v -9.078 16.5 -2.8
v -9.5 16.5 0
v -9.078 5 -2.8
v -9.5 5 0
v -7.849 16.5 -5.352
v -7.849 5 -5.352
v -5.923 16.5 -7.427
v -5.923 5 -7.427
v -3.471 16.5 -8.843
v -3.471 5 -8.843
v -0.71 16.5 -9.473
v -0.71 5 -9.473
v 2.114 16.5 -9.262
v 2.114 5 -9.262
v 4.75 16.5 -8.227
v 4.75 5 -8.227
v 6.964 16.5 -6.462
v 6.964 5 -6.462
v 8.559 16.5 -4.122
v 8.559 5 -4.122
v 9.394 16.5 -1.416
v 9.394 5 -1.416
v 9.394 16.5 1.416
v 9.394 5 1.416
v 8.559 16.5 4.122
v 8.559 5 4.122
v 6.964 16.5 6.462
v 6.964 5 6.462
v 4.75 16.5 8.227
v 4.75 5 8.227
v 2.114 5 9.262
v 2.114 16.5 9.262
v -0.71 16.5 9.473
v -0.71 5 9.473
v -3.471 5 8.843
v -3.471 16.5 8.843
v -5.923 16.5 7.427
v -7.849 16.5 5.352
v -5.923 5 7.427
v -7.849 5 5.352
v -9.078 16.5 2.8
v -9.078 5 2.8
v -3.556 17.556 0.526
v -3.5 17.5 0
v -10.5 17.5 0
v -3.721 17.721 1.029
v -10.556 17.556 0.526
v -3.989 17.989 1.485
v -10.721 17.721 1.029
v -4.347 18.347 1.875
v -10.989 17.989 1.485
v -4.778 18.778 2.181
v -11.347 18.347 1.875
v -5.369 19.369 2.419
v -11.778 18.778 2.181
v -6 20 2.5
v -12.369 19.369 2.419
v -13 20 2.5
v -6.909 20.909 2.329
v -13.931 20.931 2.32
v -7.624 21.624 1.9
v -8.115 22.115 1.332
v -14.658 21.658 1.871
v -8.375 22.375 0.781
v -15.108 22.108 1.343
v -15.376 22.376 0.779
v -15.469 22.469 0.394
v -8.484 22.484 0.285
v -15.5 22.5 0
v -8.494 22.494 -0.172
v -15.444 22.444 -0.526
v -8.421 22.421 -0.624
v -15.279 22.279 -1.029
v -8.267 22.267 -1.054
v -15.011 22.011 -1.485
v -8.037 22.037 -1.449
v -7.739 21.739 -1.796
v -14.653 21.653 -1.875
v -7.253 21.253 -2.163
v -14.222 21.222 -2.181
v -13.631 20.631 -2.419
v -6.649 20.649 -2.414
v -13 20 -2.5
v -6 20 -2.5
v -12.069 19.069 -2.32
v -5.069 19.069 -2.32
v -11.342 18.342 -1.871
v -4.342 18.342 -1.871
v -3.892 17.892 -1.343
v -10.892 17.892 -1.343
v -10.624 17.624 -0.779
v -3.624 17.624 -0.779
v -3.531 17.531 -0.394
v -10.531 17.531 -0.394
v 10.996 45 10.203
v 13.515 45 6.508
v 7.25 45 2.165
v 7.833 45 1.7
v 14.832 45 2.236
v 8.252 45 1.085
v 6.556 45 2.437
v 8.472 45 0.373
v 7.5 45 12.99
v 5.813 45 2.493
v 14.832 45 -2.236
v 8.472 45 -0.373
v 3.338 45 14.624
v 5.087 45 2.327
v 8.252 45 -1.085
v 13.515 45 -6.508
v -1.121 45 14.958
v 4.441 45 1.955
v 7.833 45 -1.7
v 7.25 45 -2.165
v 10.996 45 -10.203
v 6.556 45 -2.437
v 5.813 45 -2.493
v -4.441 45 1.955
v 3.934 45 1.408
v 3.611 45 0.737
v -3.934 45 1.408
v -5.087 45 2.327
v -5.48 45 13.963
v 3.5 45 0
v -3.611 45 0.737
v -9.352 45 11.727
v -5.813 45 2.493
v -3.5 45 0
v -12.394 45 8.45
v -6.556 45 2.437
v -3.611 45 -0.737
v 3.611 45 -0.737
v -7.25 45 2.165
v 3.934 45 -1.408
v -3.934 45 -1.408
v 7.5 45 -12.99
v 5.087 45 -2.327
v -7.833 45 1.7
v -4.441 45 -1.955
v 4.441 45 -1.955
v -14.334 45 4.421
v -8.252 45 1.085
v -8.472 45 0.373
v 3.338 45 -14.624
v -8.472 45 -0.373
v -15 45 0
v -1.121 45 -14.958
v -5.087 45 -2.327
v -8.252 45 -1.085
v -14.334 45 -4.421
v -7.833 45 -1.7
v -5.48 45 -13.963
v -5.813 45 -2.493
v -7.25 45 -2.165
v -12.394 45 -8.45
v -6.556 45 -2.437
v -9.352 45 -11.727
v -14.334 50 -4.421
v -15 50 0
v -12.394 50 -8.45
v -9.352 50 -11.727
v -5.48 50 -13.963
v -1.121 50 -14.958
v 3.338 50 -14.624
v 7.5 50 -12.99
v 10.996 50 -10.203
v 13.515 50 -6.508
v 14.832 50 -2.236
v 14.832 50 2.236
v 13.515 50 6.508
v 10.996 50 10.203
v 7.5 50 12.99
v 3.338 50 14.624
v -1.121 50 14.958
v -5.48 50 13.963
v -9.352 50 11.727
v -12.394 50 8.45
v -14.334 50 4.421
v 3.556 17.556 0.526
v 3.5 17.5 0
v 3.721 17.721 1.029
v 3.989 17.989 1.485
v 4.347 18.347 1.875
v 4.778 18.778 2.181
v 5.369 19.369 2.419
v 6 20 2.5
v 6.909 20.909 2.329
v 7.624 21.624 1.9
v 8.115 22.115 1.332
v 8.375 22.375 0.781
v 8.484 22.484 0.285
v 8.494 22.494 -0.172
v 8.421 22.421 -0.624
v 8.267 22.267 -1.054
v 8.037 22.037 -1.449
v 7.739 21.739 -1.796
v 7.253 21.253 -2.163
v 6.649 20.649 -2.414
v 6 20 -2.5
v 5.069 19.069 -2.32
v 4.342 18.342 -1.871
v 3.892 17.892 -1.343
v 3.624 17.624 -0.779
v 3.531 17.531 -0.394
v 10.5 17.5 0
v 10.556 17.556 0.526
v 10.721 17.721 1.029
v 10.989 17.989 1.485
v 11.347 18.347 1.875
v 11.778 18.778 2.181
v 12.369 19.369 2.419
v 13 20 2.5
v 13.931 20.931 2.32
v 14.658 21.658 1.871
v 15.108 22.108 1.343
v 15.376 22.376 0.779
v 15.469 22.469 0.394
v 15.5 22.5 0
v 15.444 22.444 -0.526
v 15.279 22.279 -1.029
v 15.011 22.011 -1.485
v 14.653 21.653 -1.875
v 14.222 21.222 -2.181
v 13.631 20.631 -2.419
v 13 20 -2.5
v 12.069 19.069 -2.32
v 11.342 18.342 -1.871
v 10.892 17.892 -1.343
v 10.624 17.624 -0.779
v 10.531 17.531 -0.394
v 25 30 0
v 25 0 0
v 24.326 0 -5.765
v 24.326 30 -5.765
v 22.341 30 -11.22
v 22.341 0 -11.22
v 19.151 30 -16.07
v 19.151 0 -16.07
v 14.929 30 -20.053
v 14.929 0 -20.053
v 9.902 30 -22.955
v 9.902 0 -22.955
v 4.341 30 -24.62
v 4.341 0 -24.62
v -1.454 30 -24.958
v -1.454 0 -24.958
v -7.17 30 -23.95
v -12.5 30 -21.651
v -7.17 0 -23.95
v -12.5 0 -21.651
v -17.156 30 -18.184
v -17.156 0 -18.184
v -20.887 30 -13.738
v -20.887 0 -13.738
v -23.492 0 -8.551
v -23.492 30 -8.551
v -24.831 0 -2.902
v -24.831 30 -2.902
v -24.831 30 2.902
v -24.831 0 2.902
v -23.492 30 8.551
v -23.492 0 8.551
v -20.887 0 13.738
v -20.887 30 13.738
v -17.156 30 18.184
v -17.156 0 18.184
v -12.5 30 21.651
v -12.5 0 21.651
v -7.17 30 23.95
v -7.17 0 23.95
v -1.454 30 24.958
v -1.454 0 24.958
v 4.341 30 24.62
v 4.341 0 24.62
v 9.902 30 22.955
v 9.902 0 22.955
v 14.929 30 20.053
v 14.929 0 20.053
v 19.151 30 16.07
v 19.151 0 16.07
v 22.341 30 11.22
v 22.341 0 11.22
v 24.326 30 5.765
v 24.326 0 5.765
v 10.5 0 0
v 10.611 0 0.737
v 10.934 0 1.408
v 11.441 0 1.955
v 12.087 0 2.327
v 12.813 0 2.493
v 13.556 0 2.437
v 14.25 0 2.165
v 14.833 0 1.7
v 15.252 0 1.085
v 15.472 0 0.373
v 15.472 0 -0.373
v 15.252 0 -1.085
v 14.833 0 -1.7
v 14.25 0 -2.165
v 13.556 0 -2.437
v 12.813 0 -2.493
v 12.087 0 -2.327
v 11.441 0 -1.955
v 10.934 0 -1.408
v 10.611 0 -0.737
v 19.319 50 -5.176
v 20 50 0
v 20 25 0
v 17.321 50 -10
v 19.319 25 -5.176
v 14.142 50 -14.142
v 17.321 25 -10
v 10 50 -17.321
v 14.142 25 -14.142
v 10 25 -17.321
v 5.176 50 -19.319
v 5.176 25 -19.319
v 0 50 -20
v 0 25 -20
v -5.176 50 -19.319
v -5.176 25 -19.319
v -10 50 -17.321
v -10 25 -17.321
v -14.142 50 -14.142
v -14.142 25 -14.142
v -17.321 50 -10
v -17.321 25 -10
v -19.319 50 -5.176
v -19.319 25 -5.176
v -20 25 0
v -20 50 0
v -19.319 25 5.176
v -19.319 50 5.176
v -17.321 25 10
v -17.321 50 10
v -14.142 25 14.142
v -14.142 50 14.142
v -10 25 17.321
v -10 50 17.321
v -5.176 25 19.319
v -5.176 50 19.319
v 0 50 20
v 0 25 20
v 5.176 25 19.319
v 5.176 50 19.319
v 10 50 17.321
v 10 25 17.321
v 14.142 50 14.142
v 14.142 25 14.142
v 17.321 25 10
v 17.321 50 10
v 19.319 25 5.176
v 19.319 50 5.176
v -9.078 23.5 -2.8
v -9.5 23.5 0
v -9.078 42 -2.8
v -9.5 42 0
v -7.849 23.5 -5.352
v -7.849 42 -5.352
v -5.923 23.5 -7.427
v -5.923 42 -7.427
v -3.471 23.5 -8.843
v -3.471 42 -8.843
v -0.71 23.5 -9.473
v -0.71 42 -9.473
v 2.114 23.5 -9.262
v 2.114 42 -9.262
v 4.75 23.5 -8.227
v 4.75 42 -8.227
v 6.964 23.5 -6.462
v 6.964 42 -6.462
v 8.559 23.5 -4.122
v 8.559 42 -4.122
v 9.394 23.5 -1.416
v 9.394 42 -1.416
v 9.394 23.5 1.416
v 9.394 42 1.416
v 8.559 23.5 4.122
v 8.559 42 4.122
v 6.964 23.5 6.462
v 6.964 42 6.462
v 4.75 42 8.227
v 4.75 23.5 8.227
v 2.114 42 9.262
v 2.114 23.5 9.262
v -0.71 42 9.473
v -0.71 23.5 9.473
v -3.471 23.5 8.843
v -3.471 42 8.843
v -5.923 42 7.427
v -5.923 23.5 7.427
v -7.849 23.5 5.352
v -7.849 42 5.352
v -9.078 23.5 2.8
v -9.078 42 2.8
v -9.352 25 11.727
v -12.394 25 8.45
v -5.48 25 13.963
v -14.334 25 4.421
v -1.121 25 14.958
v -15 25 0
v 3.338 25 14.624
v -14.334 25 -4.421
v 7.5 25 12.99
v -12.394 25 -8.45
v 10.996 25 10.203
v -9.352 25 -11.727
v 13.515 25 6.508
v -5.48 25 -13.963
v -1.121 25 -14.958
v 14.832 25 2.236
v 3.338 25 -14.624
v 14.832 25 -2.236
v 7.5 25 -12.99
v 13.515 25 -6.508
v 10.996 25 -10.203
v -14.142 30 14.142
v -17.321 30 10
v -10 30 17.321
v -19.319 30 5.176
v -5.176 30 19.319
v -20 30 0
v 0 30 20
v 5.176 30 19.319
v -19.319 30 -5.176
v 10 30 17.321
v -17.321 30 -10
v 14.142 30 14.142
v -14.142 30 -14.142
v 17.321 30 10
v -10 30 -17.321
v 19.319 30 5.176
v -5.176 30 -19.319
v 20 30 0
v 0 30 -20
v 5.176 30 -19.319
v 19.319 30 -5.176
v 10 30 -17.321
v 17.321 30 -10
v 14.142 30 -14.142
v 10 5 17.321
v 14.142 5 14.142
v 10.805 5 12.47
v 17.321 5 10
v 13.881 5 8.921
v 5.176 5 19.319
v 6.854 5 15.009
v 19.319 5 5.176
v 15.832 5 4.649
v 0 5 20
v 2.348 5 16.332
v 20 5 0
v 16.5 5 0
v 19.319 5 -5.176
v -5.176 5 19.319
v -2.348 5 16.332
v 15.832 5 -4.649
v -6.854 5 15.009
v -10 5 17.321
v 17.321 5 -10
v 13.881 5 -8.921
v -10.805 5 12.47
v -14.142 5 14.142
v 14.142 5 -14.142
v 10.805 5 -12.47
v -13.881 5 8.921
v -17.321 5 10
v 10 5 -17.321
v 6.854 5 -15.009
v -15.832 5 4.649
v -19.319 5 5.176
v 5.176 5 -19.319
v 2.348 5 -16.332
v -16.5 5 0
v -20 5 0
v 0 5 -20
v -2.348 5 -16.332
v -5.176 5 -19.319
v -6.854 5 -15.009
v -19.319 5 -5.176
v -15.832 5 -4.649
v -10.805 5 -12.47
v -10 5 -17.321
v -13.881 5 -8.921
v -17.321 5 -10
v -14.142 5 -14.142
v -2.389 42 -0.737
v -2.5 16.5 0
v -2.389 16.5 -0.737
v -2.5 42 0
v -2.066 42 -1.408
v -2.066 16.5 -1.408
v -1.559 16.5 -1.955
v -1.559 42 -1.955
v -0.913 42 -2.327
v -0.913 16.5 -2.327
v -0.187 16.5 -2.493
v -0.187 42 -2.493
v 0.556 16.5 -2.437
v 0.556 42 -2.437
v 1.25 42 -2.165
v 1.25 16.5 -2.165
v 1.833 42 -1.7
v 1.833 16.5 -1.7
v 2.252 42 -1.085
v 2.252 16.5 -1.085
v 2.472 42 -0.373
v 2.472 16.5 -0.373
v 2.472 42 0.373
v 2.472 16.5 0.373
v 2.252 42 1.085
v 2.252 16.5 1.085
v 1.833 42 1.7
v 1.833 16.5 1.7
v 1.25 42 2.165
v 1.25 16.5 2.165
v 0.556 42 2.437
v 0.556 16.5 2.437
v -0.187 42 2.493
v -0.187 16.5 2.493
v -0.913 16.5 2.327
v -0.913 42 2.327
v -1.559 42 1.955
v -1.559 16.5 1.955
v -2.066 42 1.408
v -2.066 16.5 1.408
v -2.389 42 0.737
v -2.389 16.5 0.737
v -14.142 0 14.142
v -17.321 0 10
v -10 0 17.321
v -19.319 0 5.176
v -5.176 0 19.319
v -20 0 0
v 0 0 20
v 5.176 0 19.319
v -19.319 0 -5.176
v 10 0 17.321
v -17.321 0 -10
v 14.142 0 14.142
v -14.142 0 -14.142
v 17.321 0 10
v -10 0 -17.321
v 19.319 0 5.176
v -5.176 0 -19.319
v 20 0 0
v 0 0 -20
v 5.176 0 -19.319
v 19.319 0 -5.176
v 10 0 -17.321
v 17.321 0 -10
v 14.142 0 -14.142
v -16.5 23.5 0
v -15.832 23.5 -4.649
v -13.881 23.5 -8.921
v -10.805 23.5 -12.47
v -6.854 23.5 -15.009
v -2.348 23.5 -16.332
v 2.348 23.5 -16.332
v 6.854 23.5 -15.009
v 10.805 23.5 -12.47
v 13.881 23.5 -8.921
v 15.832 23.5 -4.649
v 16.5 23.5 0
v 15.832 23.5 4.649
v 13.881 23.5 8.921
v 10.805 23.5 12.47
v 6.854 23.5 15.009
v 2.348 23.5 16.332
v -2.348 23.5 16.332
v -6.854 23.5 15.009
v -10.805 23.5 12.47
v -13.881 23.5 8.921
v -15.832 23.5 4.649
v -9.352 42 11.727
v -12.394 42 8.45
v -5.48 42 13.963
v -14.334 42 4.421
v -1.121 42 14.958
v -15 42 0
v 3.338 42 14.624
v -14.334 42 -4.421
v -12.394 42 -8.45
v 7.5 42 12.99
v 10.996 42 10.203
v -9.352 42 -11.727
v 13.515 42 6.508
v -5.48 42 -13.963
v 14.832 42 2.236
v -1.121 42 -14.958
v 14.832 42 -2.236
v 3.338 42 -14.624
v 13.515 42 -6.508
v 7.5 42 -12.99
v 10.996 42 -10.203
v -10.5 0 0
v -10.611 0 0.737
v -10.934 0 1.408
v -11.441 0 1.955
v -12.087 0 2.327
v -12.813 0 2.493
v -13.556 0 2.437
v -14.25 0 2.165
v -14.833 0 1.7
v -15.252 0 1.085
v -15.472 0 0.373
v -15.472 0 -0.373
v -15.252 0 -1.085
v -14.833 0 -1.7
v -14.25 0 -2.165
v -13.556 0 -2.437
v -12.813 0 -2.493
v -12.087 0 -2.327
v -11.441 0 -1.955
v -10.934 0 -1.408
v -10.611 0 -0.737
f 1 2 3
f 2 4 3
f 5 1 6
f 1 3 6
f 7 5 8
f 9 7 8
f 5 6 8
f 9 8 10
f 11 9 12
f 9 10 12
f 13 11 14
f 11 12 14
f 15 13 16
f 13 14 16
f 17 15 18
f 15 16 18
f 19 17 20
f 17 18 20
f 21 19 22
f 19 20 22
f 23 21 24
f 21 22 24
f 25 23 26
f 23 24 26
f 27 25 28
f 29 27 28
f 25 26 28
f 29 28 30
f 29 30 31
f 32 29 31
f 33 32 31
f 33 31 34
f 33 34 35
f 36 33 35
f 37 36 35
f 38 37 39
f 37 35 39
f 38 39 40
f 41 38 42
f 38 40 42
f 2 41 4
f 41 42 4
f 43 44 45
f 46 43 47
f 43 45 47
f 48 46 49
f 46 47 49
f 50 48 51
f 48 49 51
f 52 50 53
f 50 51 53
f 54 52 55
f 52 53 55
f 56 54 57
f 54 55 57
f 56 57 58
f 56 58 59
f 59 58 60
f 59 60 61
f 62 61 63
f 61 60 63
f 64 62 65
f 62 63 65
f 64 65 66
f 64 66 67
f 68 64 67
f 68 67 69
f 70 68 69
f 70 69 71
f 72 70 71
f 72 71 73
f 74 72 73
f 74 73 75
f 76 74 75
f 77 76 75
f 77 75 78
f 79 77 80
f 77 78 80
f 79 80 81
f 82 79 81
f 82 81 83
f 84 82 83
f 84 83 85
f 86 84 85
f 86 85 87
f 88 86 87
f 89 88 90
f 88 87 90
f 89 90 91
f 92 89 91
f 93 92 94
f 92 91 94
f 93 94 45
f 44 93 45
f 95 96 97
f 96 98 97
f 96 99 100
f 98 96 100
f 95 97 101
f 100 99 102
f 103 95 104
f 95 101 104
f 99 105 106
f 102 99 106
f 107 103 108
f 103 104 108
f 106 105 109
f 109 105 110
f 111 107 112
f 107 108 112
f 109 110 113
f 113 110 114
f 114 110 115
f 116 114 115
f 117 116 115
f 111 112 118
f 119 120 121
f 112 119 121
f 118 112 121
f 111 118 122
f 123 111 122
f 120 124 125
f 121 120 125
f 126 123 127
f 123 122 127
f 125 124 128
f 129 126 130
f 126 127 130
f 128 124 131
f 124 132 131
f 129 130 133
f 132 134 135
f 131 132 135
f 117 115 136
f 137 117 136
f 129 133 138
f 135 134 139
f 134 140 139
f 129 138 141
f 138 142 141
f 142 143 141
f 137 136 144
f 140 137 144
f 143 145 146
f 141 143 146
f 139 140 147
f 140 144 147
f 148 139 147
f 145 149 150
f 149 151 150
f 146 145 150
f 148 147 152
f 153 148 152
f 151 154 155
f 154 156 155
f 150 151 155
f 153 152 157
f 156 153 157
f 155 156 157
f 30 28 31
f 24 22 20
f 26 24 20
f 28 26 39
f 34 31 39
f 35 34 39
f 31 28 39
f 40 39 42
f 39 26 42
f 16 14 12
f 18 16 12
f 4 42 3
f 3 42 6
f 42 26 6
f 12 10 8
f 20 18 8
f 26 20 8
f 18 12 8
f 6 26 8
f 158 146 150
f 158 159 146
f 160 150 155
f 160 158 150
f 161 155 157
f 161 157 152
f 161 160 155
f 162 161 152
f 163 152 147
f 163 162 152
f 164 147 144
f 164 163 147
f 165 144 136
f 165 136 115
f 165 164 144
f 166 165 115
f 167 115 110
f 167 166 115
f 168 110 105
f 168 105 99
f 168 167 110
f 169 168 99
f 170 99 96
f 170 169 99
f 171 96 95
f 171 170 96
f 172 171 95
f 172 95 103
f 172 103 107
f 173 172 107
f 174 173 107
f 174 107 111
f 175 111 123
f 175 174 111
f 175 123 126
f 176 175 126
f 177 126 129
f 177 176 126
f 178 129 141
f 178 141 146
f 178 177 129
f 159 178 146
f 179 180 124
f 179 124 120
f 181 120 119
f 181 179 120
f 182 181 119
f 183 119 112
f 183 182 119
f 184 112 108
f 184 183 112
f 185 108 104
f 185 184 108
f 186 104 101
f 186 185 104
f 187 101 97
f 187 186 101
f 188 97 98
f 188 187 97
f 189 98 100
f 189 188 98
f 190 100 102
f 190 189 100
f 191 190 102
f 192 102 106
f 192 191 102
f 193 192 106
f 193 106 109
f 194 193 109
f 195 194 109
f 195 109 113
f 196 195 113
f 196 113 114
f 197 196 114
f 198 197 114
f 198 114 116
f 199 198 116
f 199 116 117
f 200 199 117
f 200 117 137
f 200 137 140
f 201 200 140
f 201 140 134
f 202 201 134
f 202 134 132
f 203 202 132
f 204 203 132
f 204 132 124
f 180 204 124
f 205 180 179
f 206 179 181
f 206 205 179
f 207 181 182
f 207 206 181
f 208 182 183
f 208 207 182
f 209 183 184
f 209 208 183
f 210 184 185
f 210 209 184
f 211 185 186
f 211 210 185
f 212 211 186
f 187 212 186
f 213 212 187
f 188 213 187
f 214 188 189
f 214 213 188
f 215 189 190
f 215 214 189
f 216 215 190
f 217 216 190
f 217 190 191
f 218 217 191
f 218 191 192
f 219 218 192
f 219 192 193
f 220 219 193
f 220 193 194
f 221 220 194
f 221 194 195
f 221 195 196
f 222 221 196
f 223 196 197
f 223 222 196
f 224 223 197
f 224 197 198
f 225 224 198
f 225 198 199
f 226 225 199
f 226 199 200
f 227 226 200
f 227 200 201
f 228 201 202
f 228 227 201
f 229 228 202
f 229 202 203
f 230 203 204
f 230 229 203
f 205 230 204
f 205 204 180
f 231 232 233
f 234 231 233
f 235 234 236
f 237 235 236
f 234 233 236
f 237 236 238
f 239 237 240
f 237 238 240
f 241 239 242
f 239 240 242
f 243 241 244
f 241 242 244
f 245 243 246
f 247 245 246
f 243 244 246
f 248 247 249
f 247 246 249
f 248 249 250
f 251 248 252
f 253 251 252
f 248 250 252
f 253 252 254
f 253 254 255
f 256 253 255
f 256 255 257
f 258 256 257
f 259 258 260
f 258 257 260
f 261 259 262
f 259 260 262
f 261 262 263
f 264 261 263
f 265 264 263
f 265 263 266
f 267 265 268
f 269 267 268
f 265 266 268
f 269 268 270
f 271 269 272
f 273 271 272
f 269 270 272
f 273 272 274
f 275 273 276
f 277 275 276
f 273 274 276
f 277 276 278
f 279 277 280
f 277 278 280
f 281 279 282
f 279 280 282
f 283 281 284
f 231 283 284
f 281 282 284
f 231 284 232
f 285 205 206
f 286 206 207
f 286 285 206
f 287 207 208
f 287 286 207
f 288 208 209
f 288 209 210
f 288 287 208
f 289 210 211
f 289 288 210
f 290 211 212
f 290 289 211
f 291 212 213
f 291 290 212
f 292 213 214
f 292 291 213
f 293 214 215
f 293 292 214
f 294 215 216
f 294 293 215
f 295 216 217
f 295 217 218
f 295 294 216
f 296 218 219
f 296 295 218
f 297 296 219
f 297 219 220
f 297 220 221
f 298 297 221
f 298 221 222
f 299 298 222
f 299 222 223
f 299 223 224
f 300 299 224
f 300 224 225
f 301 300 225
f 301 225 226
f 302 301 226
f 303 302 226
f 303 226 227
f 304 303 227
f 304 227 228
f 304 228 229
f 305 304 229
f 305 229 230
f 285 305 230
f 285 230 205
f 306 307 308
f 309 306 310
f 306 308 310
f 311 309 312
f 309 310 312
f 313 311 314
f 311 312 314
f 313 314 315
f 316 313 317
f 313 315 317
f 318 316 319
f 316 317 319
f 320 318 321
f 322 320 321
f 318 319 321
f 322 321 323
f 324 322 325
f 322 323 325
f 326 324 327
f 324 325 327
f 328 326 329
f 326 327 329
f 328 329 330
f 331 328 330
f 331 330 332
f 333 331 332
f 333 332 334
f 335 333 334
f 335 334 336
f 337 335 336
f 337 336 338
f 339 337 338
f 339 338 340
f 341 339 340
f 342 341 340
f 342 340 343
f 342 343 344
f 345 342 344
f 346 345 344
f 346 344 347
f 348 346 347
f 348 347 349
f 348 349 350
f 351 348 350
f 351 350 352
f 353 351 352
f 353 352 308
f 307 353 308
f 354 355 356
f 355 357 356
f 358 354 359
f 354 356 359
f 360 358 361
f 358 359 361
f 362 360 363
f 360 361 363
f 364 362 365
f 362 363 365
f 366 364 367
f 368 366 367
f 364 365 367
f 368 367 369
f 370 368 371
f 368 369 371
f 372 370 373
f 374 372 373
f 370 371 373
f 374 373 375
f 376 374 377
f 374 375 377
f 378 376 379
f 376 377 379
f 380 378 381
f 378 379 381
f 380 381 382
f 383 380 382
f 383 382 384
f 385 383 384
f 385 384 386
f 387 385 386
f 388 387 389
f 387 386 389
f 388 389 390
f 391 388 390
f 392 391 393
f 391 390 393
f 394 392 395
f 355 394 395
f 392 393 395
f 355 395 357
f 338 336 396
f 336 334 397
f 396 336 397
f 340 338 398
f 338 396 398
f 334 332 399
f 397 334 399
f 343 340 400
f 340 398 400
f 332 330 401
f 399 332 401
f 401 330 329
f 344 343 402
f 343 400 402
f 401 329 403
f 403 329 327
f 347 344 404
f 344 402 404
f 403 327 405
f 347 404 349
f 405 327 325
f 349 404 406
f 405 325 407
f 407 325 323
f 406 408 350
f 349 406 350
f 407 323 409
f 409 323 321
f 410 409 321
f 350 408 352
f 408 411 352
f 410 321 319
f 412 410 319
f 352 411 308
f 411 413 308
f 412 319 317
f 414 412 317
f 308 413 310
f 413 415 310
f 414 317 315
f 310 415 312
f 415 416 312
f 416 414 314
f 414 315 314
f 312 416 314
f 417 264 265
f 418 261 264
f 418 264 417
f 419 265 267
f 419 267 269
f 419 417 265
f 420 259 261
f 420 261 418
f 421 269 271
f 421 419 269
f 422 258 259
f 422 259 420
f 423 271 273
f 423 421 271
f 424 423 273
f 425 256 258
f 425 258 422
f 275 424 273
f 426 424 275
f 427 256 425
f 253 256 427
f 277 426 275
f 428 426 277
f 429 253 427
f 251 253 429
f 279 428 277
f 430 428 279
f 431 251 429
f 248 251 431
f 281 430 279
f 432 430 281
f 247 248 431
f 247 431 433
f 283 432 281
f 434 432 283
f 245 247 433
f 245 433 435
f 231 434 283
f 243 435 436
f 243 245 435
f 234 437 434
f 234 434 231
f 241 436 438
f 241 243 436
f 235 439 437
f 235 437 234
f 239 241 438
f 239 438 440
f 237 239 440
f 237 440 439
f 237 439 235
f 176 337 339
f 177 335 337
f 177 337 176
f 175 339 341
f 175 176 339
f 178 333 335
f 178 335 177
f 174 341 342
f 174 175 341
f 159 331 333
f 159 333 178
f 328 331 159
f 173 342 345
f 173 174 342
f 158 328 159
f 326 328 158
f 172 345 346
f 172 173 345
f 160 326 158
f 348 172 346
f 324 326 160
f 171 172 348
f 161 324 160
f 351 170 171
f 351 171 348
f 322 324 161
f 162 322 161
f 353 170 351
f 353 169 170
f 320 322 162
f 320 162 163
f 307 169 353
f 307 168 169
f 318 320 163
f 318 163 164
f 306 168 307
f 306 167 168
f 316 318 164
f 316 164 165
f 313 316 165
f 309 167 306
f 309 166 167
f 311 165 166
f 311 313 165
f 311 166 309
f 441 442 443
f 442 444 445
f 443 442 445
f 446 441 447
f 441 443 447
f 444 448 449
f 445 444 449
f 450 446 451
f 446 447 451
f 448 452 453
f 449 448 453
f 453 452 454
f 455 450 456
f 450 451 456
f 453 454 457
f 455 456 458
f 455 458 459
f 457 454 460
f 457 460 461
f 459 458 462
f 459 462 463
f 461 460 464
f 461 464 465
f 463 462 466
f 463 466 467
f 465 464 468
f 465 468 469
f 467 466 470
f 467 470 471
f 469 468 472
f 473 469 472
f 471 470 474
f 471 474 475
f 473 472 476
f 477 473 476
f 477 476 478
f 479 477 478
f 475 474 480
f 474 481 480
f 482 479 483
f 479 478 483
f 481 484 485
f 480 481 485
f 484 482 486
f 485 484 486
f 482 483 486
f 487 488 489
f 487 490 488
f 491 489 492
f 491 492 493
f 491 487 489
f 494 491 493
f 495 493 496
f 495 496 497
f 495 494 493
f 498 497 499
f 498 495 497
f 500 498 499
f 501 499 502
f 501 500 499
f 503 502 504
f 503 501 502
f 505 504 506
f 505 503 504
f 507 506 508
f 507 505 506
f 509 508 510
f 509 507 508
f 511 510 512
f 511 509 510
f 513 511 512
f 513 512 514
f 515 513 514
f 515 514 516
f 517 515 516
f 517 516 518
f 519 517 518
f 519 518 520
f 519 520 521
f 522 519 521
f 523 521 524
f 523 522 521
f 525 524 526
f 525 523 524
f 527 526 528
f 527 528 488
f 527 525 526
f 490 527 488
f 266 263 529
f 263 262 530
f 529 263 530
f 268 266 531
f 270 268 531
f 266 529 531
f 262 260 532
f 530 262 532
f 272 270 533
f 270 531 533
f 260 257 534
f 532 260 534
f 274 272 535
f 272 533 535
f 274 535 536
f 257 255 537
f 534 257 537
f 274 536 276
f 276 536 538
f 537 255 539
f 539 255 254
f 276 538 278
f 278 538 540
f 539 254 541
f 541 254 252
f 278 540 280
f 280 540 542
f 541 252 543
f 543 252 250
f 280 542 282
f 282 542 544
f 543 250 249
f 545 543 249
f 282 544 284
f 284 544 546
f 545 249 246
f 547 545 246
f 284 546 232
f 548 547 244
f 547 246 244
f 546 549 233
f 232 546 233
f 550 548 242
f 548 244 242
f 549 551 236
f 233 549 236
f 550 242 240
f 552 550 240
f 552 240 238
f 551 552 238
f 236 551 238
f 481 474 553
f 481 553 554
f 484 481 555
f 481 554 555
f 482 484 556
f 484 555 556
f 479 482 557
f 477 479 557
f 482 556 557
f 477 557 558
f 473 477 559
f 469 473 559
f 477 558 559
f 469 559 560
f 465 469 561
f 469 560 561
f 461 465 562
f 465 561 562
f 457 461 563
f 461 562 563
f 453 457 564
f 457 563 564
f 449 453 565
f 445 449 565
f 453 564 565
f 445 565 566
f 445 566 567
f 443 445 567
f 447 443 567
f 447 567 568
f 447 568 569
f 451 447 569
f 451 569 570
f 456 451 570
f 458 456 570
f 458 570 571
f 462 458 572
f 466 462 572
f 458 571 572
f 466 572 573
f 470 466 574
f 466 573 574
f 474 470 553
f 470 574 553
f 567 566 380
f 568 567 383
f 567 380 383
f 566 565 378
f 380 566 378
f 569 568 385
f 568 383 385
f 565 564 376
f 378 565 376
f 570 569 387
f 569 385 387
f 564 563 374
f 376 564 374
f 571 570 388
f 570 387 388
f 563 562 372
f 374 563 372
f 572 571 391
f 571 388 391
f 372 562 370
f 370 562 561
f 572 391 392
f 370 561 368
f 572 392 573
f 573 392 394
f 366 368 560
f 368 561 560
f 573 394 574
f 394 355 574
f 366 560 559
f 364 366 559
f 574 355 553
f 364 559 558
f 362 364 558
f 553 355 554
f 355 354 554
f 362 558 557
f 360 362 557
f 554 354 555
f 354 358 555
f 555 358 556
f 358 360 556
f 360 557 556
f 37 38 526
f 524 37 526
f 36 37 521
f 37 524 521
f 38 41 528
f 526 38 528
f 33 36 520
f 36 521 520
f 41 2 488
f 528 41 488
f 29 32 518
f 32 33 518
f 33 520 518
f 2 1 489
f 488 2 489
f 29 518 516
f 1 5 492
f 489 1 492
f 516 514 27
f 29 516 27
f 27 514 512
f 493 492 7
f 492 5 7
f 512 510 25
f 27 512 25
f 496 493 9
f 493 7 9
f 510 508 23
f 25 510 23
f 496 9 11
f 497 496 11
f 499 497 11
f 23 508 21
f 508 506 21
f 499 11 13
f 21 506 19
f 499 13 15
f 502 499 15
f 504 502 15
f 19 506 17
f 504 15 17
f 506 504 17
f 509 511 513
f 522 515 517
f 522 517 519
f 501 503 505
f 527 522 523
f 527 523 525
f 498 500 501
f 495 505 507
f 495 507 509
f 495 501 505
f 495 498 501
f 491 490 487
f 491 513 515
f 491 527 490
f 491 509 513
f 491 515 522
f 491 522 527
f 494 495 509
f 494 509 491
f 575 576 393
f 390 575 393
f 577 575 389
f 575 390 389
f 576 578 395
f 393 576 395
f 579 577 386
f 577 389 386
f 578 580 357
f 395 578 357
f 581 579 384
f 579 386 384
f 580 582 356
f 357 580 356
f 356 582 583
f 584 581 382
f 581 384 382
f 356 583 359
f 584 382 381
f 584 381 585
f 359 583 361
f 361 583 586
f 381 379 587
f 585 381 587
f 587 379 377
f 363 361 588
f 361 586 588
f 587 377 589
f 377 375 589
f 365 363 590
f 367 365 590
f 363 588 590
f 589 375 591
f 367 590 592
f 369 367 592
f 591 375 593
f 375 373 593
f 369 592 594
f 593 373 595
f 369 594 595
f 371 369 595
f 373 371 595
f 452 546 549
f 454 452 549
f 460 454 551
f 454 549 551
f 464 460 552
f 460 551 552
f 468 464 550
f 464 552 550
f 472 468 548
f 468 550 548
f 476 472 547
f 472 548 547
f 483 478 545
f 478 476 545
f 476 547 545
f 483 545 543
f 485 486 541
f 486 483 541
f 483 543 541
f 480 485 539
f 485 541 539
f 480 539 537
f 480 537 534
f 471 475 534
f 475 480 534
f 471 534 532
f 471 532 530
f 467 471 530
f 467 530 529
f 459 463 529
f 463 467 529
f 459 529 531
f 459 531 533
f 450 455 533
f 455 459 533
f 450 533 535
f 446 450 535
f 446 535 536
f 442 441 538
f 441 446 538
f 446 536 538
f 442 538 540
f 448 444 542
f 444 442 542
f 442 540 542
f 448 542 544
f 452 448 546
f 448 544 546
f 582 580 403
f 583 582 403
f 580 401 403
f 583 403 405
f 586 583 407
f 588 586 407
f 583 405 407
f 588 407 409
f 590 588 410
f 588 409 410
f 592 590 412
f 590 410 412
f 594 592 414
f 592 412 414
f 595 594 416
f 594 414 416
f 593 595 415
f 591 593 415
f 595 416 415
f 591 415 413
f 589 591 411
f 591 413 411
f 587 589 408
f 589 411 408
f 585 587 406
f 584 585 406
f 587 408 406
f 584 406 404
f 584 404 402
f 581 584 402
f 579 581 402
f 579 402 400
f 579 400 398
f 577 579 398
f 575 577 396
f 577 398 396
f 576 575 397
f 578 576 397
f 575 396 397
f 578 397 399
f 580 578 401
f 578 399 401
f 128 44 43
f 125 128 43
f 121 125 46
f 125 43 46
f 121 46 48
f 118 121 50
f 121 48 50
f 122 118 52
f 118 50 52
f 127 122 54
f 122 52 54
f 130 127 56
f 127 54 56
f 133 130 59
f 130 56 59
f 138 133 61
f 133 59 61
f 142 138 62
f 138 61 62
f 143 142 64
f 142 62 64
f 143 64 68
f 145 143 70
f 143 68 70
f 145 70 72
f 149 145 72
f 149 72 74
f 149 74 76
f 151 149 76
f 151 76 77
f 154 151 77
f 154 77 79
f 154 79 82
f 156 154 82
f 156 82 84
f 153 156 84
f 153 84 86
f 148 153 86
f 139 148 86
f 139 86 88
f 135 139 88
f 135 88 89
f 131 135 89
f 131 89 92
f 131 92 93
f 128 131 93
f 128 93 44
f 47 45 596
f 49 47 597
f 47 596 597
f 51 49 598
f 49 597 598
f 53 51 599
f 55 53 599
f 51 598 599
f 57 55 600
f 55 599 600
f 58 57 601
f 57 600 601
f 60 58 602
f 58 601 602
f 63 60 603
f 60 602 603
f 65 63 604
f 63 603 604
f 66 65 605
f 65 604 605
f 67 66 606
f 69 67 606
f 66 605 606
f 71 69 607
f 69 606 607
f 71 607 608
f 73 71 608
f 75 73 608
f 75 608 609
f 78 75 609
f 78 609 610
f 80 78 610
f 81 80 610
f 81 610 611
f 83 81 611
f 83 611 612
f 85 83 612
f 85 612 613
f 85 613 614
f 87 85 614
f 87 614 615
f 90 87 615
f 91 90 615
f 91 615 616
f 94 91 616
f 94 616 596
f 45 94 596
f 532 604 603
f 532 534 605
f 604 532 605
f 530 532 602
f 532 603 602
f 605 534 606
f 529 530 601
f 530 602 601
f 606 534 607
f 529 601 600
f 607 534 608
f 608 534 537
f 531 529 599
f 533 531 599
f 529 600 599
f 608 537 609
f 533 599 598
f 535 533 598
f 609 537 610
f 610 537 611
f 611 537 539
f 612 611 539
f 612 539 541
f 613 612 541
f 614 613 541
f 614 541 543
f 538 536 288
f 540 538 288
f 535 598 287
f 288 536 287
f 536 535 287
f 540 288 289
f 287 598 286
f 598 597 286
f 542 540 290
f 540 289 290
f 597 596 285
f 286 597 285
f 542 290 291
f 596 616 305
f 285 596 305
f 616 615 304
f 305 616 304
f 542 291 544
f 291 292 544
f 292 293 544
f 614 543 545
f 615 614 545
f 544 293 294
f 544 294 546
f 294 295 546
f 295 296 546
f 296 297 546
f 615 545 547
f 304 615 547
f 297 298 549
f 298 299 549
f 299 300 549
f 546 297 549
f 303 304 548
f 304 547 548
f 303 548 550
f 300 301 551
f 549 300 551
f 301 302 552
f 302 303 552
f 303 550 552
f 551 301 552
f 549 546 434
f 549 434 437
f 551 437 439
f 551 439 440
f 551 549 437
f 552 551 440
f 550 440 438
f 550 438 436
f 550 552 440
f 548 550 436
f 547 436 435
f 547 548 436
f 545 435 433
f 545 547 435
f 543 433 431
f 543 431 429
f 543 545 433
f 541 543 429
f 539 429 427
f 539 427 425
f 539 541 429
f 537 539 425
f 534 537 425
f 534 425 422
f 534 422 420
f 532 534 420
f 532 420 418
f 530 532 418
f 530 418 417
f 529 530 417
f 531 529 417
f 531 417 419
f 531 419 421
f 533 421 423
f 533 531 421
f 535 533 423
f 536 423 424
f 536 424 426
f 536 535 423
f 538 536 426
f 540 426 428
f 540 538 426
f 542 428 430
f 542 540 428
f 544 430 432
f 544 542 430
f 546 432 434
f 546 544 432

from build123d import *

# Parameters (mm, degrees)
SKETCH2_R           = 25
SKETCH2_R_2         = 20
BOSS_EXTRUDE1_DEPTH = 30
SKETCH2_4_R         = 20
BOSS_EXTRUDE2_DEPTH = 50
SKETCH3_4_W         = 2.5
SKETCH3_4_H         = 25.5
SKETCH3_5_W         = 15
SKETCH3_5_H         = 5
SKETCH4_R           = 2.5


with BuildPart() as part:
    # Sketch2 → Boss-Extrude1 (new body)
    with BuildSketch(Plane(origin=(0, 0, 0), x_dir=(1, 0, 0), z_dir=(0, 1, 0))):
        Circle(SKETCH2_R)
        Circle(SKETCH2_R_2, mode=Mode.SUBTRACT)
    extrude(amount=BOSS_EXTRUDE1_DEPTH)


with BuildPart() as body_2:
    # Sketch2<4> → Boss-Extrude2 (new body)
    with BuildSketch(Plane(origin=(0, 0, 0), x_dir=(1, 0, 0), z_dir=(0, 1, 0))):
        Circle(SKETCH2_4_R)
    extrude(amount=BOSS_EXTRUDE2_DEPTH)

    # Sketch3 → Cut-Revolve1 (revolve, cut)
    with BuildSketch(Plane.XY):
        Polygon((-15, 42), (-9.5, 42), (-9.5, 23.5), (-16.5, 23.5), (-16.5, 5), (-20, 5), (-20, 25), (-15, 25), align=None)
    revolve(axis=Axis((0, 50, 0), (0, -1, 0)), mode=Mode.SUBTRACT)

    # Sketch3<4> → Cut-Revolve2 (revolve, cut)
    with BuildSketch(Plane.XY):
        with Locations((-1.25, 29.25)):
            Rectangle(SKETCH3_4_W, SKETCH3_4_H)
        Polygon((0, 16.5), (-2.5, 16.5), (-9.5, 16.5), (-9.5, 5), (0, 5), align=None)
    revolve(axis=Axis((0, 50, 0), (0, -1, 0)), mode=Mode.SUBTRACT)

    # Sketch3<5> → Cut-Revolve3 (revolve, cut)
    with BuildSketch(Plane.XY):
        with Locations((-7.5, 47.5)):
            Rectangle(SKETCH3_5_W, SKETCH3_5_H)
    revolve(axis=Axis((0, 50, 0), (0, -1, 0)), mode=Mode.SUBTRACT)

    # Cut-Sweep1: sweep along a path in Sketch3<10>
    with BuildLine(Plane.XY) as cut_sweep1_path:
        Line((-6, 45), (-6, 20))
        Line((-6, 20), (-13, 20))
        Line((-13, 20), (-13, 0))
    # Sketch4 → Cut-Sweep1 (sweep, cut)
    with BuildSketch(Plane(origin=(0, 45, 0), x_dir=(1, 0, 0), z_dir=(0, 1, 0))):
        with Locations((-6, 0)):
            Circle(SKETCH4_R)
    cut_sweep1 = sweep(path=cut_sweep1_path.line, transition=Transition.RIGHT, mode=Mode.SUBTRACT)

    # Mirror1: Cut-Sweep1 across plane
    add(cut_sweep1.mirror(Plane(origin=(0, 0, 0), x_dir=(0, 0, 1), z_dir=(1, 0, 0))), mode=Mode.SUBTRACT)


solid = Compound([part.part, body_2.part])
